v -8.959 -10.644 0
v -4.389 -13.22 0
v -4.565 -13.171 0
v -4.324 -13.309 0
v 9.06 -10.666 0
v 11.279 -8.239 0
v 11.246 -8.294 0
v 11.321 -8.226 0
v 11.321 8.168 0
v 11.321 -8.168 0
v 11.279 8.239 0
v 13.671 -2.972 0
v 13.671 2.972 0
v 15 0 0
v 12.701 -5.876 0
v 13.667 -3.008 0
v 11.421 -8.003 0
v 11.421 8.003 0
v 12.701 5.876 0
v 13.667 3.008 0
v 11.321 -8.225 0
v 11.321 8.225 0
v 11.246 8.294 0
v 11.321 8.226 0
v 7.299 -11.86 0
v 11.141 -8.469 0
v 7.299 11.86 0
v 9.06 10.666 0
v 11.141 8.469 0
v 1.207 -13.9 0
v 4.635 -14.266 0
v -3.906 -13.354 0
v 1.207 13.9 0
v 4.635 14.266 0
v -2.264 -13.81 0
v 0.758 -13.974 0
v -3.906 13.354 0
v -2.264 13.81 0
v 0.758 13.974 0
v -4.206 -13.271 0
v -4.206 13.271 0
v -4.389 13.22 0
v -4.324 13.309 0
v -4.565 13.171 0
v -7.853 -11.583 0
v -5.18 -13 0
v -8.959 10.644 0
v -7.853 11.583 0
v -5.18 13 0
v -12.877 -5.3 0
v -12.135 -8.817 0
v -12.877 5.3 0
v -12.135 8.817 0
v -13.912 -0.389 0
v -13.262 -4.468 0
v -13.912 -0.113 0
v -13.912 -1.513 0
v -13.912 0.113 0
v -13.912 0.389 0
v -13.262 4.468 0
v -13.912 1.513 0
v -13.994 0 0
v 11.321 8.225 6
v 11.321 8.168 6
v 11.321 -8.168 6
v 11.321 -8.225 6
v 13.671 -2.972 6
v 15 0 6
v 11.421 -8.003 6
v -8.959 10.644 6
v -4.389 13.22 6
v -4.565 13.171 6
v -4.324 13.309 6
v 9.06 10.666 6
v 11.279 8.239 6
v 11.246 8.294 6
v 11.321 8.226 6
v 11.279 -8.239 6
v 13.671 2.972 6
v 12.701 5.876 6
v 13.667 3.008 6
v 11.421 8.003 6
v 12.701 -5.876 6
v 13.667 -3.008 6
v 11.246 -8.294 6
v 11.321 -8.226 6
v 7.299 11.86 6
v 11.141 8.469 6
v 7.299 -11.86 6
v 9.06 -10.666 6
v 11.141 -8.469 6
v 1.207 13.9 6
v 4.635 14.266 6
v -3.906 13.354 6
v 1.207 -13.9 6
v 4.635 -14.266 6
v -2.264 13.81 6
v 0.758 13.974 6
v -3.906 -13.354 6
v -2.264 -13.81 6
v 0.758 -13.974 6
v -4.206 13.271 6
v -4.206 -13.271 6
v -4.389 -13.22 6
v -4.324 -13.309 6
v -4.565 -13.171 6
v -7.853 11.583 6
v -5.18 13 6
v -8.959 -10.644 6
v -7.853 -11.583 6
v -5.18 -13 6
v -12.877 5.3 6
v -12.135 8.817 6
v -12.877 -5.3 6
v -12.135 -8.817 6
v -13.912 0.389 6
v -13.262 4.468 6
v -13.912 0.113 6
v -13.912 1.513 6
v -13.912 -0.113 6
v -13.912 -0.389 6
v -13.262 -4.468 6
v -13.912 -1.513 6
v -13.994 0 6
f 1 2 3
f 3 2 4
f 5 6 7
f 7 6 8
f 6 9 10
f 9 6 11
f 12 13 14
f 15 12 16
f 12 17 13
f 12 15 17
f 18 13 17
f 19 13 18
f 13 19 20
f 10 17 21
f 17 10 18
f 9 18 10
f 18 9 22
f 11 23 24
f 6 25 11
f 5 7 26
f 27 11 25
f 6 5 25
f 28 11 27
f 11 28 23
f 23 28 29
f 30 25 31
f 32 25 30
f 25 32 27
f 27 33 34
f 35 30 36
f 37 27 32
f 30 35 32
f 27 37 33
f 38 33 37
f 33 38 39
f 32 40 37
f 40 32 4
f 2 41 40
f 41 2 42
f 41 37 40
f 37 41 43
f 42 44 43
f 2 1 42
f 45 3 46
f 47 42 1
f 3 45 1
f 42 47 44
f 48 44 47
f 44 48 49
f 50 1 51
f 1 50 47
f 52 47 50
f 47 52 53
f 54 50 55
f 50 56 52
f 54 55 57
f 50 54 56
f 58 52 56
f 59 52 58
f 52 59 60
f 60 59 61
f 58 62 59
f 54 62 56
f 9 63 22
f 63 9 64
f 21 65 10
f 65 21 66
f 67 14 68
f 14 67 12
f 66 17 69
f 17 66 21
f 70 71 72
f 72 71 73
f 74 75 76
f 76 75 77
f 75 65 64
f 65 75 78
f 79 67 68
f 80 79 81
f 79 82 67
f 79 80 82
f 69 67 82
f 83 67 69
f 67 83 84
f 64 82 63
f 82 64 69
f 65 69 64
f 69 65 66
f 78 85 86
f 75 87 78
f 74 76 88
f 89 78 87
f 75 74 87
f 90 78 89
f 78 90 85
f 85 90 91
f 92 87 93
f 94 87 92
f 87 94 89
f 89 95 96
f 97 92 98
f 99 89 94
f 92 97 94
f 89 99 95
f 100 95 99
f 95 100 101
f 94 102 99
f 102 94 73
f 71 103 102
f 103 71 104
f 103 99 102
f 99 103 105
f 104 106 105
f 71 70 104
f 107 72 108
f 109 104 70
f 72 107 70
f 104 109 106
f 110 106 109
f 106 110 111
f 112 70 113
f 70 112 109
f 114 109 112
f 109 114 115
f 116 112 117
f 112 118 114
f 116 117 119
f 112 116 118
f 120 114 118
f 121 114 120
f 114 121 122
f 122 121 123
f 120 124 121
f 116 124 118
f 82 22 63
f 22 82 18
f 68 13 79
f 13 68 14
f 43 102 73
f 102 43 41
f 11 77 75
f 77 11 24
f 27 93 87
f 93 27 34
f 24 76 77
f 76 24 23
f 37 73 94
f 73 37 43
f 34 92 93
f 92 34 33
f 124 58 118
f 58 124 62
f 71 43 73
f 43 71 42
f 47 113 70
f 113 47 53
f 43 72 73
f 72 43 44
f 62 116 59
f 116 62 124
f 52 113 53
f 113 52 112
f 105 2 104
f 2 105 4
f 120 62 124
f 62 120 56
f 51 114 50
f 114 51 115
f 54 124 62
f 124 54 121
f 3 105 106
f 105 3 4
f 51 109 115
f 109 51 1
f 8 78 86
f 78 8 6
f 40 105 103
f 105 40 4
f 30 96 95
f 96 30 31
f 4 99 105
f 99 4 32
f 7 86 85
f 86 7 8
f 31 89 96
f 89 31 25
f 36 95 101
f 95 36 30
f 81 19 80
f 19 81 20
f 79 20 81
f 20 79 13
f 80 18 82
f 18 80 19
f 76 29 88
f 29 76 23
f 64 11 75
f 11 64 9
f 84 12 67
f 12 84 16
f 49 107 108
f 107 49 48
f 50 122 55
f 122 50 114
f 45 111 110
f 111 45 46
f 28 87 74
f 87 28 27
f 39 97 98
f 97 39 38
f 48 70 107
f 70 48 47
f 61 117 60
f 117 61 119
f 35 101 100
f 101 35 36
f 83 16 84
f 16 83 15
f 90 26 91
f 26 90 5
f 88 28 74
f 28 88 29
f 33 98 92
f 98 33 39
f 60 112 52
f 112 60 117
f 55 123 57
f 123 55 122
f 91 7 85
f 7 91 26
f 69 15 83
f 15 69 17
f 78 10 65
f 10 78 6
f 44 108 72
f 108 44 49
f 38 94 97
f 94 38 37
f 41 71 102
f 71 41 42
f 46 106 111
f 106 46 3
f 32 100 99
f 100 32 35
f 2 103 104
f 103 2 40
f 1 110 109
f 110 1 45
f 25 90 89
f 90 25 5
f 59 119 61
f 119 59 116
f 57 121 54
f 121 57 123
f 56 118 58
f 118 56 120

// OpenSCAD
//very simple point object
module Point(length=5, base=5, h=6) {
    
    linear_extrude(height=h){
        polygon(points=[
            [0     ,  base/2],
            [0     , -base/2],
            [length,  0     ]
        ]);
    }
    
}

function setPl( pointLength, tot, straight, T) =
    (straight)? (tot*sin(90-T))/(sin(T)+sin(90-T)) : pointLength;

//Creates a star with a given number of points
//Gap if $fn is not properly set
//@straight: will override pointLength to make sure star appears to
// be constructed of connected straight lines
module Star(points=5, pointLength=5, h=6, inscCirc=24, straight=false) {
    lTheta = 180 / points;
    pL = setPl(pointLength, inscCirc/2, straight, 2*lTheta);
    echo(pL);
    
    A      = (inscCirc / 2) - pL;
    radius = A / cos(lTheta);
    B      = 2*radius*sin(lTheta);
    echo(A);

    
    cylinder(r=radius, h=h);
    for(i = [0:points])
        rotate([0,0, 2*i*lTheta])
            translate([A,0,0])
                Point(length=pL, base=B, h=h);

}

$fn=29;

Star(points=5, pointLength=6, inscCirc=30, straight=true);
